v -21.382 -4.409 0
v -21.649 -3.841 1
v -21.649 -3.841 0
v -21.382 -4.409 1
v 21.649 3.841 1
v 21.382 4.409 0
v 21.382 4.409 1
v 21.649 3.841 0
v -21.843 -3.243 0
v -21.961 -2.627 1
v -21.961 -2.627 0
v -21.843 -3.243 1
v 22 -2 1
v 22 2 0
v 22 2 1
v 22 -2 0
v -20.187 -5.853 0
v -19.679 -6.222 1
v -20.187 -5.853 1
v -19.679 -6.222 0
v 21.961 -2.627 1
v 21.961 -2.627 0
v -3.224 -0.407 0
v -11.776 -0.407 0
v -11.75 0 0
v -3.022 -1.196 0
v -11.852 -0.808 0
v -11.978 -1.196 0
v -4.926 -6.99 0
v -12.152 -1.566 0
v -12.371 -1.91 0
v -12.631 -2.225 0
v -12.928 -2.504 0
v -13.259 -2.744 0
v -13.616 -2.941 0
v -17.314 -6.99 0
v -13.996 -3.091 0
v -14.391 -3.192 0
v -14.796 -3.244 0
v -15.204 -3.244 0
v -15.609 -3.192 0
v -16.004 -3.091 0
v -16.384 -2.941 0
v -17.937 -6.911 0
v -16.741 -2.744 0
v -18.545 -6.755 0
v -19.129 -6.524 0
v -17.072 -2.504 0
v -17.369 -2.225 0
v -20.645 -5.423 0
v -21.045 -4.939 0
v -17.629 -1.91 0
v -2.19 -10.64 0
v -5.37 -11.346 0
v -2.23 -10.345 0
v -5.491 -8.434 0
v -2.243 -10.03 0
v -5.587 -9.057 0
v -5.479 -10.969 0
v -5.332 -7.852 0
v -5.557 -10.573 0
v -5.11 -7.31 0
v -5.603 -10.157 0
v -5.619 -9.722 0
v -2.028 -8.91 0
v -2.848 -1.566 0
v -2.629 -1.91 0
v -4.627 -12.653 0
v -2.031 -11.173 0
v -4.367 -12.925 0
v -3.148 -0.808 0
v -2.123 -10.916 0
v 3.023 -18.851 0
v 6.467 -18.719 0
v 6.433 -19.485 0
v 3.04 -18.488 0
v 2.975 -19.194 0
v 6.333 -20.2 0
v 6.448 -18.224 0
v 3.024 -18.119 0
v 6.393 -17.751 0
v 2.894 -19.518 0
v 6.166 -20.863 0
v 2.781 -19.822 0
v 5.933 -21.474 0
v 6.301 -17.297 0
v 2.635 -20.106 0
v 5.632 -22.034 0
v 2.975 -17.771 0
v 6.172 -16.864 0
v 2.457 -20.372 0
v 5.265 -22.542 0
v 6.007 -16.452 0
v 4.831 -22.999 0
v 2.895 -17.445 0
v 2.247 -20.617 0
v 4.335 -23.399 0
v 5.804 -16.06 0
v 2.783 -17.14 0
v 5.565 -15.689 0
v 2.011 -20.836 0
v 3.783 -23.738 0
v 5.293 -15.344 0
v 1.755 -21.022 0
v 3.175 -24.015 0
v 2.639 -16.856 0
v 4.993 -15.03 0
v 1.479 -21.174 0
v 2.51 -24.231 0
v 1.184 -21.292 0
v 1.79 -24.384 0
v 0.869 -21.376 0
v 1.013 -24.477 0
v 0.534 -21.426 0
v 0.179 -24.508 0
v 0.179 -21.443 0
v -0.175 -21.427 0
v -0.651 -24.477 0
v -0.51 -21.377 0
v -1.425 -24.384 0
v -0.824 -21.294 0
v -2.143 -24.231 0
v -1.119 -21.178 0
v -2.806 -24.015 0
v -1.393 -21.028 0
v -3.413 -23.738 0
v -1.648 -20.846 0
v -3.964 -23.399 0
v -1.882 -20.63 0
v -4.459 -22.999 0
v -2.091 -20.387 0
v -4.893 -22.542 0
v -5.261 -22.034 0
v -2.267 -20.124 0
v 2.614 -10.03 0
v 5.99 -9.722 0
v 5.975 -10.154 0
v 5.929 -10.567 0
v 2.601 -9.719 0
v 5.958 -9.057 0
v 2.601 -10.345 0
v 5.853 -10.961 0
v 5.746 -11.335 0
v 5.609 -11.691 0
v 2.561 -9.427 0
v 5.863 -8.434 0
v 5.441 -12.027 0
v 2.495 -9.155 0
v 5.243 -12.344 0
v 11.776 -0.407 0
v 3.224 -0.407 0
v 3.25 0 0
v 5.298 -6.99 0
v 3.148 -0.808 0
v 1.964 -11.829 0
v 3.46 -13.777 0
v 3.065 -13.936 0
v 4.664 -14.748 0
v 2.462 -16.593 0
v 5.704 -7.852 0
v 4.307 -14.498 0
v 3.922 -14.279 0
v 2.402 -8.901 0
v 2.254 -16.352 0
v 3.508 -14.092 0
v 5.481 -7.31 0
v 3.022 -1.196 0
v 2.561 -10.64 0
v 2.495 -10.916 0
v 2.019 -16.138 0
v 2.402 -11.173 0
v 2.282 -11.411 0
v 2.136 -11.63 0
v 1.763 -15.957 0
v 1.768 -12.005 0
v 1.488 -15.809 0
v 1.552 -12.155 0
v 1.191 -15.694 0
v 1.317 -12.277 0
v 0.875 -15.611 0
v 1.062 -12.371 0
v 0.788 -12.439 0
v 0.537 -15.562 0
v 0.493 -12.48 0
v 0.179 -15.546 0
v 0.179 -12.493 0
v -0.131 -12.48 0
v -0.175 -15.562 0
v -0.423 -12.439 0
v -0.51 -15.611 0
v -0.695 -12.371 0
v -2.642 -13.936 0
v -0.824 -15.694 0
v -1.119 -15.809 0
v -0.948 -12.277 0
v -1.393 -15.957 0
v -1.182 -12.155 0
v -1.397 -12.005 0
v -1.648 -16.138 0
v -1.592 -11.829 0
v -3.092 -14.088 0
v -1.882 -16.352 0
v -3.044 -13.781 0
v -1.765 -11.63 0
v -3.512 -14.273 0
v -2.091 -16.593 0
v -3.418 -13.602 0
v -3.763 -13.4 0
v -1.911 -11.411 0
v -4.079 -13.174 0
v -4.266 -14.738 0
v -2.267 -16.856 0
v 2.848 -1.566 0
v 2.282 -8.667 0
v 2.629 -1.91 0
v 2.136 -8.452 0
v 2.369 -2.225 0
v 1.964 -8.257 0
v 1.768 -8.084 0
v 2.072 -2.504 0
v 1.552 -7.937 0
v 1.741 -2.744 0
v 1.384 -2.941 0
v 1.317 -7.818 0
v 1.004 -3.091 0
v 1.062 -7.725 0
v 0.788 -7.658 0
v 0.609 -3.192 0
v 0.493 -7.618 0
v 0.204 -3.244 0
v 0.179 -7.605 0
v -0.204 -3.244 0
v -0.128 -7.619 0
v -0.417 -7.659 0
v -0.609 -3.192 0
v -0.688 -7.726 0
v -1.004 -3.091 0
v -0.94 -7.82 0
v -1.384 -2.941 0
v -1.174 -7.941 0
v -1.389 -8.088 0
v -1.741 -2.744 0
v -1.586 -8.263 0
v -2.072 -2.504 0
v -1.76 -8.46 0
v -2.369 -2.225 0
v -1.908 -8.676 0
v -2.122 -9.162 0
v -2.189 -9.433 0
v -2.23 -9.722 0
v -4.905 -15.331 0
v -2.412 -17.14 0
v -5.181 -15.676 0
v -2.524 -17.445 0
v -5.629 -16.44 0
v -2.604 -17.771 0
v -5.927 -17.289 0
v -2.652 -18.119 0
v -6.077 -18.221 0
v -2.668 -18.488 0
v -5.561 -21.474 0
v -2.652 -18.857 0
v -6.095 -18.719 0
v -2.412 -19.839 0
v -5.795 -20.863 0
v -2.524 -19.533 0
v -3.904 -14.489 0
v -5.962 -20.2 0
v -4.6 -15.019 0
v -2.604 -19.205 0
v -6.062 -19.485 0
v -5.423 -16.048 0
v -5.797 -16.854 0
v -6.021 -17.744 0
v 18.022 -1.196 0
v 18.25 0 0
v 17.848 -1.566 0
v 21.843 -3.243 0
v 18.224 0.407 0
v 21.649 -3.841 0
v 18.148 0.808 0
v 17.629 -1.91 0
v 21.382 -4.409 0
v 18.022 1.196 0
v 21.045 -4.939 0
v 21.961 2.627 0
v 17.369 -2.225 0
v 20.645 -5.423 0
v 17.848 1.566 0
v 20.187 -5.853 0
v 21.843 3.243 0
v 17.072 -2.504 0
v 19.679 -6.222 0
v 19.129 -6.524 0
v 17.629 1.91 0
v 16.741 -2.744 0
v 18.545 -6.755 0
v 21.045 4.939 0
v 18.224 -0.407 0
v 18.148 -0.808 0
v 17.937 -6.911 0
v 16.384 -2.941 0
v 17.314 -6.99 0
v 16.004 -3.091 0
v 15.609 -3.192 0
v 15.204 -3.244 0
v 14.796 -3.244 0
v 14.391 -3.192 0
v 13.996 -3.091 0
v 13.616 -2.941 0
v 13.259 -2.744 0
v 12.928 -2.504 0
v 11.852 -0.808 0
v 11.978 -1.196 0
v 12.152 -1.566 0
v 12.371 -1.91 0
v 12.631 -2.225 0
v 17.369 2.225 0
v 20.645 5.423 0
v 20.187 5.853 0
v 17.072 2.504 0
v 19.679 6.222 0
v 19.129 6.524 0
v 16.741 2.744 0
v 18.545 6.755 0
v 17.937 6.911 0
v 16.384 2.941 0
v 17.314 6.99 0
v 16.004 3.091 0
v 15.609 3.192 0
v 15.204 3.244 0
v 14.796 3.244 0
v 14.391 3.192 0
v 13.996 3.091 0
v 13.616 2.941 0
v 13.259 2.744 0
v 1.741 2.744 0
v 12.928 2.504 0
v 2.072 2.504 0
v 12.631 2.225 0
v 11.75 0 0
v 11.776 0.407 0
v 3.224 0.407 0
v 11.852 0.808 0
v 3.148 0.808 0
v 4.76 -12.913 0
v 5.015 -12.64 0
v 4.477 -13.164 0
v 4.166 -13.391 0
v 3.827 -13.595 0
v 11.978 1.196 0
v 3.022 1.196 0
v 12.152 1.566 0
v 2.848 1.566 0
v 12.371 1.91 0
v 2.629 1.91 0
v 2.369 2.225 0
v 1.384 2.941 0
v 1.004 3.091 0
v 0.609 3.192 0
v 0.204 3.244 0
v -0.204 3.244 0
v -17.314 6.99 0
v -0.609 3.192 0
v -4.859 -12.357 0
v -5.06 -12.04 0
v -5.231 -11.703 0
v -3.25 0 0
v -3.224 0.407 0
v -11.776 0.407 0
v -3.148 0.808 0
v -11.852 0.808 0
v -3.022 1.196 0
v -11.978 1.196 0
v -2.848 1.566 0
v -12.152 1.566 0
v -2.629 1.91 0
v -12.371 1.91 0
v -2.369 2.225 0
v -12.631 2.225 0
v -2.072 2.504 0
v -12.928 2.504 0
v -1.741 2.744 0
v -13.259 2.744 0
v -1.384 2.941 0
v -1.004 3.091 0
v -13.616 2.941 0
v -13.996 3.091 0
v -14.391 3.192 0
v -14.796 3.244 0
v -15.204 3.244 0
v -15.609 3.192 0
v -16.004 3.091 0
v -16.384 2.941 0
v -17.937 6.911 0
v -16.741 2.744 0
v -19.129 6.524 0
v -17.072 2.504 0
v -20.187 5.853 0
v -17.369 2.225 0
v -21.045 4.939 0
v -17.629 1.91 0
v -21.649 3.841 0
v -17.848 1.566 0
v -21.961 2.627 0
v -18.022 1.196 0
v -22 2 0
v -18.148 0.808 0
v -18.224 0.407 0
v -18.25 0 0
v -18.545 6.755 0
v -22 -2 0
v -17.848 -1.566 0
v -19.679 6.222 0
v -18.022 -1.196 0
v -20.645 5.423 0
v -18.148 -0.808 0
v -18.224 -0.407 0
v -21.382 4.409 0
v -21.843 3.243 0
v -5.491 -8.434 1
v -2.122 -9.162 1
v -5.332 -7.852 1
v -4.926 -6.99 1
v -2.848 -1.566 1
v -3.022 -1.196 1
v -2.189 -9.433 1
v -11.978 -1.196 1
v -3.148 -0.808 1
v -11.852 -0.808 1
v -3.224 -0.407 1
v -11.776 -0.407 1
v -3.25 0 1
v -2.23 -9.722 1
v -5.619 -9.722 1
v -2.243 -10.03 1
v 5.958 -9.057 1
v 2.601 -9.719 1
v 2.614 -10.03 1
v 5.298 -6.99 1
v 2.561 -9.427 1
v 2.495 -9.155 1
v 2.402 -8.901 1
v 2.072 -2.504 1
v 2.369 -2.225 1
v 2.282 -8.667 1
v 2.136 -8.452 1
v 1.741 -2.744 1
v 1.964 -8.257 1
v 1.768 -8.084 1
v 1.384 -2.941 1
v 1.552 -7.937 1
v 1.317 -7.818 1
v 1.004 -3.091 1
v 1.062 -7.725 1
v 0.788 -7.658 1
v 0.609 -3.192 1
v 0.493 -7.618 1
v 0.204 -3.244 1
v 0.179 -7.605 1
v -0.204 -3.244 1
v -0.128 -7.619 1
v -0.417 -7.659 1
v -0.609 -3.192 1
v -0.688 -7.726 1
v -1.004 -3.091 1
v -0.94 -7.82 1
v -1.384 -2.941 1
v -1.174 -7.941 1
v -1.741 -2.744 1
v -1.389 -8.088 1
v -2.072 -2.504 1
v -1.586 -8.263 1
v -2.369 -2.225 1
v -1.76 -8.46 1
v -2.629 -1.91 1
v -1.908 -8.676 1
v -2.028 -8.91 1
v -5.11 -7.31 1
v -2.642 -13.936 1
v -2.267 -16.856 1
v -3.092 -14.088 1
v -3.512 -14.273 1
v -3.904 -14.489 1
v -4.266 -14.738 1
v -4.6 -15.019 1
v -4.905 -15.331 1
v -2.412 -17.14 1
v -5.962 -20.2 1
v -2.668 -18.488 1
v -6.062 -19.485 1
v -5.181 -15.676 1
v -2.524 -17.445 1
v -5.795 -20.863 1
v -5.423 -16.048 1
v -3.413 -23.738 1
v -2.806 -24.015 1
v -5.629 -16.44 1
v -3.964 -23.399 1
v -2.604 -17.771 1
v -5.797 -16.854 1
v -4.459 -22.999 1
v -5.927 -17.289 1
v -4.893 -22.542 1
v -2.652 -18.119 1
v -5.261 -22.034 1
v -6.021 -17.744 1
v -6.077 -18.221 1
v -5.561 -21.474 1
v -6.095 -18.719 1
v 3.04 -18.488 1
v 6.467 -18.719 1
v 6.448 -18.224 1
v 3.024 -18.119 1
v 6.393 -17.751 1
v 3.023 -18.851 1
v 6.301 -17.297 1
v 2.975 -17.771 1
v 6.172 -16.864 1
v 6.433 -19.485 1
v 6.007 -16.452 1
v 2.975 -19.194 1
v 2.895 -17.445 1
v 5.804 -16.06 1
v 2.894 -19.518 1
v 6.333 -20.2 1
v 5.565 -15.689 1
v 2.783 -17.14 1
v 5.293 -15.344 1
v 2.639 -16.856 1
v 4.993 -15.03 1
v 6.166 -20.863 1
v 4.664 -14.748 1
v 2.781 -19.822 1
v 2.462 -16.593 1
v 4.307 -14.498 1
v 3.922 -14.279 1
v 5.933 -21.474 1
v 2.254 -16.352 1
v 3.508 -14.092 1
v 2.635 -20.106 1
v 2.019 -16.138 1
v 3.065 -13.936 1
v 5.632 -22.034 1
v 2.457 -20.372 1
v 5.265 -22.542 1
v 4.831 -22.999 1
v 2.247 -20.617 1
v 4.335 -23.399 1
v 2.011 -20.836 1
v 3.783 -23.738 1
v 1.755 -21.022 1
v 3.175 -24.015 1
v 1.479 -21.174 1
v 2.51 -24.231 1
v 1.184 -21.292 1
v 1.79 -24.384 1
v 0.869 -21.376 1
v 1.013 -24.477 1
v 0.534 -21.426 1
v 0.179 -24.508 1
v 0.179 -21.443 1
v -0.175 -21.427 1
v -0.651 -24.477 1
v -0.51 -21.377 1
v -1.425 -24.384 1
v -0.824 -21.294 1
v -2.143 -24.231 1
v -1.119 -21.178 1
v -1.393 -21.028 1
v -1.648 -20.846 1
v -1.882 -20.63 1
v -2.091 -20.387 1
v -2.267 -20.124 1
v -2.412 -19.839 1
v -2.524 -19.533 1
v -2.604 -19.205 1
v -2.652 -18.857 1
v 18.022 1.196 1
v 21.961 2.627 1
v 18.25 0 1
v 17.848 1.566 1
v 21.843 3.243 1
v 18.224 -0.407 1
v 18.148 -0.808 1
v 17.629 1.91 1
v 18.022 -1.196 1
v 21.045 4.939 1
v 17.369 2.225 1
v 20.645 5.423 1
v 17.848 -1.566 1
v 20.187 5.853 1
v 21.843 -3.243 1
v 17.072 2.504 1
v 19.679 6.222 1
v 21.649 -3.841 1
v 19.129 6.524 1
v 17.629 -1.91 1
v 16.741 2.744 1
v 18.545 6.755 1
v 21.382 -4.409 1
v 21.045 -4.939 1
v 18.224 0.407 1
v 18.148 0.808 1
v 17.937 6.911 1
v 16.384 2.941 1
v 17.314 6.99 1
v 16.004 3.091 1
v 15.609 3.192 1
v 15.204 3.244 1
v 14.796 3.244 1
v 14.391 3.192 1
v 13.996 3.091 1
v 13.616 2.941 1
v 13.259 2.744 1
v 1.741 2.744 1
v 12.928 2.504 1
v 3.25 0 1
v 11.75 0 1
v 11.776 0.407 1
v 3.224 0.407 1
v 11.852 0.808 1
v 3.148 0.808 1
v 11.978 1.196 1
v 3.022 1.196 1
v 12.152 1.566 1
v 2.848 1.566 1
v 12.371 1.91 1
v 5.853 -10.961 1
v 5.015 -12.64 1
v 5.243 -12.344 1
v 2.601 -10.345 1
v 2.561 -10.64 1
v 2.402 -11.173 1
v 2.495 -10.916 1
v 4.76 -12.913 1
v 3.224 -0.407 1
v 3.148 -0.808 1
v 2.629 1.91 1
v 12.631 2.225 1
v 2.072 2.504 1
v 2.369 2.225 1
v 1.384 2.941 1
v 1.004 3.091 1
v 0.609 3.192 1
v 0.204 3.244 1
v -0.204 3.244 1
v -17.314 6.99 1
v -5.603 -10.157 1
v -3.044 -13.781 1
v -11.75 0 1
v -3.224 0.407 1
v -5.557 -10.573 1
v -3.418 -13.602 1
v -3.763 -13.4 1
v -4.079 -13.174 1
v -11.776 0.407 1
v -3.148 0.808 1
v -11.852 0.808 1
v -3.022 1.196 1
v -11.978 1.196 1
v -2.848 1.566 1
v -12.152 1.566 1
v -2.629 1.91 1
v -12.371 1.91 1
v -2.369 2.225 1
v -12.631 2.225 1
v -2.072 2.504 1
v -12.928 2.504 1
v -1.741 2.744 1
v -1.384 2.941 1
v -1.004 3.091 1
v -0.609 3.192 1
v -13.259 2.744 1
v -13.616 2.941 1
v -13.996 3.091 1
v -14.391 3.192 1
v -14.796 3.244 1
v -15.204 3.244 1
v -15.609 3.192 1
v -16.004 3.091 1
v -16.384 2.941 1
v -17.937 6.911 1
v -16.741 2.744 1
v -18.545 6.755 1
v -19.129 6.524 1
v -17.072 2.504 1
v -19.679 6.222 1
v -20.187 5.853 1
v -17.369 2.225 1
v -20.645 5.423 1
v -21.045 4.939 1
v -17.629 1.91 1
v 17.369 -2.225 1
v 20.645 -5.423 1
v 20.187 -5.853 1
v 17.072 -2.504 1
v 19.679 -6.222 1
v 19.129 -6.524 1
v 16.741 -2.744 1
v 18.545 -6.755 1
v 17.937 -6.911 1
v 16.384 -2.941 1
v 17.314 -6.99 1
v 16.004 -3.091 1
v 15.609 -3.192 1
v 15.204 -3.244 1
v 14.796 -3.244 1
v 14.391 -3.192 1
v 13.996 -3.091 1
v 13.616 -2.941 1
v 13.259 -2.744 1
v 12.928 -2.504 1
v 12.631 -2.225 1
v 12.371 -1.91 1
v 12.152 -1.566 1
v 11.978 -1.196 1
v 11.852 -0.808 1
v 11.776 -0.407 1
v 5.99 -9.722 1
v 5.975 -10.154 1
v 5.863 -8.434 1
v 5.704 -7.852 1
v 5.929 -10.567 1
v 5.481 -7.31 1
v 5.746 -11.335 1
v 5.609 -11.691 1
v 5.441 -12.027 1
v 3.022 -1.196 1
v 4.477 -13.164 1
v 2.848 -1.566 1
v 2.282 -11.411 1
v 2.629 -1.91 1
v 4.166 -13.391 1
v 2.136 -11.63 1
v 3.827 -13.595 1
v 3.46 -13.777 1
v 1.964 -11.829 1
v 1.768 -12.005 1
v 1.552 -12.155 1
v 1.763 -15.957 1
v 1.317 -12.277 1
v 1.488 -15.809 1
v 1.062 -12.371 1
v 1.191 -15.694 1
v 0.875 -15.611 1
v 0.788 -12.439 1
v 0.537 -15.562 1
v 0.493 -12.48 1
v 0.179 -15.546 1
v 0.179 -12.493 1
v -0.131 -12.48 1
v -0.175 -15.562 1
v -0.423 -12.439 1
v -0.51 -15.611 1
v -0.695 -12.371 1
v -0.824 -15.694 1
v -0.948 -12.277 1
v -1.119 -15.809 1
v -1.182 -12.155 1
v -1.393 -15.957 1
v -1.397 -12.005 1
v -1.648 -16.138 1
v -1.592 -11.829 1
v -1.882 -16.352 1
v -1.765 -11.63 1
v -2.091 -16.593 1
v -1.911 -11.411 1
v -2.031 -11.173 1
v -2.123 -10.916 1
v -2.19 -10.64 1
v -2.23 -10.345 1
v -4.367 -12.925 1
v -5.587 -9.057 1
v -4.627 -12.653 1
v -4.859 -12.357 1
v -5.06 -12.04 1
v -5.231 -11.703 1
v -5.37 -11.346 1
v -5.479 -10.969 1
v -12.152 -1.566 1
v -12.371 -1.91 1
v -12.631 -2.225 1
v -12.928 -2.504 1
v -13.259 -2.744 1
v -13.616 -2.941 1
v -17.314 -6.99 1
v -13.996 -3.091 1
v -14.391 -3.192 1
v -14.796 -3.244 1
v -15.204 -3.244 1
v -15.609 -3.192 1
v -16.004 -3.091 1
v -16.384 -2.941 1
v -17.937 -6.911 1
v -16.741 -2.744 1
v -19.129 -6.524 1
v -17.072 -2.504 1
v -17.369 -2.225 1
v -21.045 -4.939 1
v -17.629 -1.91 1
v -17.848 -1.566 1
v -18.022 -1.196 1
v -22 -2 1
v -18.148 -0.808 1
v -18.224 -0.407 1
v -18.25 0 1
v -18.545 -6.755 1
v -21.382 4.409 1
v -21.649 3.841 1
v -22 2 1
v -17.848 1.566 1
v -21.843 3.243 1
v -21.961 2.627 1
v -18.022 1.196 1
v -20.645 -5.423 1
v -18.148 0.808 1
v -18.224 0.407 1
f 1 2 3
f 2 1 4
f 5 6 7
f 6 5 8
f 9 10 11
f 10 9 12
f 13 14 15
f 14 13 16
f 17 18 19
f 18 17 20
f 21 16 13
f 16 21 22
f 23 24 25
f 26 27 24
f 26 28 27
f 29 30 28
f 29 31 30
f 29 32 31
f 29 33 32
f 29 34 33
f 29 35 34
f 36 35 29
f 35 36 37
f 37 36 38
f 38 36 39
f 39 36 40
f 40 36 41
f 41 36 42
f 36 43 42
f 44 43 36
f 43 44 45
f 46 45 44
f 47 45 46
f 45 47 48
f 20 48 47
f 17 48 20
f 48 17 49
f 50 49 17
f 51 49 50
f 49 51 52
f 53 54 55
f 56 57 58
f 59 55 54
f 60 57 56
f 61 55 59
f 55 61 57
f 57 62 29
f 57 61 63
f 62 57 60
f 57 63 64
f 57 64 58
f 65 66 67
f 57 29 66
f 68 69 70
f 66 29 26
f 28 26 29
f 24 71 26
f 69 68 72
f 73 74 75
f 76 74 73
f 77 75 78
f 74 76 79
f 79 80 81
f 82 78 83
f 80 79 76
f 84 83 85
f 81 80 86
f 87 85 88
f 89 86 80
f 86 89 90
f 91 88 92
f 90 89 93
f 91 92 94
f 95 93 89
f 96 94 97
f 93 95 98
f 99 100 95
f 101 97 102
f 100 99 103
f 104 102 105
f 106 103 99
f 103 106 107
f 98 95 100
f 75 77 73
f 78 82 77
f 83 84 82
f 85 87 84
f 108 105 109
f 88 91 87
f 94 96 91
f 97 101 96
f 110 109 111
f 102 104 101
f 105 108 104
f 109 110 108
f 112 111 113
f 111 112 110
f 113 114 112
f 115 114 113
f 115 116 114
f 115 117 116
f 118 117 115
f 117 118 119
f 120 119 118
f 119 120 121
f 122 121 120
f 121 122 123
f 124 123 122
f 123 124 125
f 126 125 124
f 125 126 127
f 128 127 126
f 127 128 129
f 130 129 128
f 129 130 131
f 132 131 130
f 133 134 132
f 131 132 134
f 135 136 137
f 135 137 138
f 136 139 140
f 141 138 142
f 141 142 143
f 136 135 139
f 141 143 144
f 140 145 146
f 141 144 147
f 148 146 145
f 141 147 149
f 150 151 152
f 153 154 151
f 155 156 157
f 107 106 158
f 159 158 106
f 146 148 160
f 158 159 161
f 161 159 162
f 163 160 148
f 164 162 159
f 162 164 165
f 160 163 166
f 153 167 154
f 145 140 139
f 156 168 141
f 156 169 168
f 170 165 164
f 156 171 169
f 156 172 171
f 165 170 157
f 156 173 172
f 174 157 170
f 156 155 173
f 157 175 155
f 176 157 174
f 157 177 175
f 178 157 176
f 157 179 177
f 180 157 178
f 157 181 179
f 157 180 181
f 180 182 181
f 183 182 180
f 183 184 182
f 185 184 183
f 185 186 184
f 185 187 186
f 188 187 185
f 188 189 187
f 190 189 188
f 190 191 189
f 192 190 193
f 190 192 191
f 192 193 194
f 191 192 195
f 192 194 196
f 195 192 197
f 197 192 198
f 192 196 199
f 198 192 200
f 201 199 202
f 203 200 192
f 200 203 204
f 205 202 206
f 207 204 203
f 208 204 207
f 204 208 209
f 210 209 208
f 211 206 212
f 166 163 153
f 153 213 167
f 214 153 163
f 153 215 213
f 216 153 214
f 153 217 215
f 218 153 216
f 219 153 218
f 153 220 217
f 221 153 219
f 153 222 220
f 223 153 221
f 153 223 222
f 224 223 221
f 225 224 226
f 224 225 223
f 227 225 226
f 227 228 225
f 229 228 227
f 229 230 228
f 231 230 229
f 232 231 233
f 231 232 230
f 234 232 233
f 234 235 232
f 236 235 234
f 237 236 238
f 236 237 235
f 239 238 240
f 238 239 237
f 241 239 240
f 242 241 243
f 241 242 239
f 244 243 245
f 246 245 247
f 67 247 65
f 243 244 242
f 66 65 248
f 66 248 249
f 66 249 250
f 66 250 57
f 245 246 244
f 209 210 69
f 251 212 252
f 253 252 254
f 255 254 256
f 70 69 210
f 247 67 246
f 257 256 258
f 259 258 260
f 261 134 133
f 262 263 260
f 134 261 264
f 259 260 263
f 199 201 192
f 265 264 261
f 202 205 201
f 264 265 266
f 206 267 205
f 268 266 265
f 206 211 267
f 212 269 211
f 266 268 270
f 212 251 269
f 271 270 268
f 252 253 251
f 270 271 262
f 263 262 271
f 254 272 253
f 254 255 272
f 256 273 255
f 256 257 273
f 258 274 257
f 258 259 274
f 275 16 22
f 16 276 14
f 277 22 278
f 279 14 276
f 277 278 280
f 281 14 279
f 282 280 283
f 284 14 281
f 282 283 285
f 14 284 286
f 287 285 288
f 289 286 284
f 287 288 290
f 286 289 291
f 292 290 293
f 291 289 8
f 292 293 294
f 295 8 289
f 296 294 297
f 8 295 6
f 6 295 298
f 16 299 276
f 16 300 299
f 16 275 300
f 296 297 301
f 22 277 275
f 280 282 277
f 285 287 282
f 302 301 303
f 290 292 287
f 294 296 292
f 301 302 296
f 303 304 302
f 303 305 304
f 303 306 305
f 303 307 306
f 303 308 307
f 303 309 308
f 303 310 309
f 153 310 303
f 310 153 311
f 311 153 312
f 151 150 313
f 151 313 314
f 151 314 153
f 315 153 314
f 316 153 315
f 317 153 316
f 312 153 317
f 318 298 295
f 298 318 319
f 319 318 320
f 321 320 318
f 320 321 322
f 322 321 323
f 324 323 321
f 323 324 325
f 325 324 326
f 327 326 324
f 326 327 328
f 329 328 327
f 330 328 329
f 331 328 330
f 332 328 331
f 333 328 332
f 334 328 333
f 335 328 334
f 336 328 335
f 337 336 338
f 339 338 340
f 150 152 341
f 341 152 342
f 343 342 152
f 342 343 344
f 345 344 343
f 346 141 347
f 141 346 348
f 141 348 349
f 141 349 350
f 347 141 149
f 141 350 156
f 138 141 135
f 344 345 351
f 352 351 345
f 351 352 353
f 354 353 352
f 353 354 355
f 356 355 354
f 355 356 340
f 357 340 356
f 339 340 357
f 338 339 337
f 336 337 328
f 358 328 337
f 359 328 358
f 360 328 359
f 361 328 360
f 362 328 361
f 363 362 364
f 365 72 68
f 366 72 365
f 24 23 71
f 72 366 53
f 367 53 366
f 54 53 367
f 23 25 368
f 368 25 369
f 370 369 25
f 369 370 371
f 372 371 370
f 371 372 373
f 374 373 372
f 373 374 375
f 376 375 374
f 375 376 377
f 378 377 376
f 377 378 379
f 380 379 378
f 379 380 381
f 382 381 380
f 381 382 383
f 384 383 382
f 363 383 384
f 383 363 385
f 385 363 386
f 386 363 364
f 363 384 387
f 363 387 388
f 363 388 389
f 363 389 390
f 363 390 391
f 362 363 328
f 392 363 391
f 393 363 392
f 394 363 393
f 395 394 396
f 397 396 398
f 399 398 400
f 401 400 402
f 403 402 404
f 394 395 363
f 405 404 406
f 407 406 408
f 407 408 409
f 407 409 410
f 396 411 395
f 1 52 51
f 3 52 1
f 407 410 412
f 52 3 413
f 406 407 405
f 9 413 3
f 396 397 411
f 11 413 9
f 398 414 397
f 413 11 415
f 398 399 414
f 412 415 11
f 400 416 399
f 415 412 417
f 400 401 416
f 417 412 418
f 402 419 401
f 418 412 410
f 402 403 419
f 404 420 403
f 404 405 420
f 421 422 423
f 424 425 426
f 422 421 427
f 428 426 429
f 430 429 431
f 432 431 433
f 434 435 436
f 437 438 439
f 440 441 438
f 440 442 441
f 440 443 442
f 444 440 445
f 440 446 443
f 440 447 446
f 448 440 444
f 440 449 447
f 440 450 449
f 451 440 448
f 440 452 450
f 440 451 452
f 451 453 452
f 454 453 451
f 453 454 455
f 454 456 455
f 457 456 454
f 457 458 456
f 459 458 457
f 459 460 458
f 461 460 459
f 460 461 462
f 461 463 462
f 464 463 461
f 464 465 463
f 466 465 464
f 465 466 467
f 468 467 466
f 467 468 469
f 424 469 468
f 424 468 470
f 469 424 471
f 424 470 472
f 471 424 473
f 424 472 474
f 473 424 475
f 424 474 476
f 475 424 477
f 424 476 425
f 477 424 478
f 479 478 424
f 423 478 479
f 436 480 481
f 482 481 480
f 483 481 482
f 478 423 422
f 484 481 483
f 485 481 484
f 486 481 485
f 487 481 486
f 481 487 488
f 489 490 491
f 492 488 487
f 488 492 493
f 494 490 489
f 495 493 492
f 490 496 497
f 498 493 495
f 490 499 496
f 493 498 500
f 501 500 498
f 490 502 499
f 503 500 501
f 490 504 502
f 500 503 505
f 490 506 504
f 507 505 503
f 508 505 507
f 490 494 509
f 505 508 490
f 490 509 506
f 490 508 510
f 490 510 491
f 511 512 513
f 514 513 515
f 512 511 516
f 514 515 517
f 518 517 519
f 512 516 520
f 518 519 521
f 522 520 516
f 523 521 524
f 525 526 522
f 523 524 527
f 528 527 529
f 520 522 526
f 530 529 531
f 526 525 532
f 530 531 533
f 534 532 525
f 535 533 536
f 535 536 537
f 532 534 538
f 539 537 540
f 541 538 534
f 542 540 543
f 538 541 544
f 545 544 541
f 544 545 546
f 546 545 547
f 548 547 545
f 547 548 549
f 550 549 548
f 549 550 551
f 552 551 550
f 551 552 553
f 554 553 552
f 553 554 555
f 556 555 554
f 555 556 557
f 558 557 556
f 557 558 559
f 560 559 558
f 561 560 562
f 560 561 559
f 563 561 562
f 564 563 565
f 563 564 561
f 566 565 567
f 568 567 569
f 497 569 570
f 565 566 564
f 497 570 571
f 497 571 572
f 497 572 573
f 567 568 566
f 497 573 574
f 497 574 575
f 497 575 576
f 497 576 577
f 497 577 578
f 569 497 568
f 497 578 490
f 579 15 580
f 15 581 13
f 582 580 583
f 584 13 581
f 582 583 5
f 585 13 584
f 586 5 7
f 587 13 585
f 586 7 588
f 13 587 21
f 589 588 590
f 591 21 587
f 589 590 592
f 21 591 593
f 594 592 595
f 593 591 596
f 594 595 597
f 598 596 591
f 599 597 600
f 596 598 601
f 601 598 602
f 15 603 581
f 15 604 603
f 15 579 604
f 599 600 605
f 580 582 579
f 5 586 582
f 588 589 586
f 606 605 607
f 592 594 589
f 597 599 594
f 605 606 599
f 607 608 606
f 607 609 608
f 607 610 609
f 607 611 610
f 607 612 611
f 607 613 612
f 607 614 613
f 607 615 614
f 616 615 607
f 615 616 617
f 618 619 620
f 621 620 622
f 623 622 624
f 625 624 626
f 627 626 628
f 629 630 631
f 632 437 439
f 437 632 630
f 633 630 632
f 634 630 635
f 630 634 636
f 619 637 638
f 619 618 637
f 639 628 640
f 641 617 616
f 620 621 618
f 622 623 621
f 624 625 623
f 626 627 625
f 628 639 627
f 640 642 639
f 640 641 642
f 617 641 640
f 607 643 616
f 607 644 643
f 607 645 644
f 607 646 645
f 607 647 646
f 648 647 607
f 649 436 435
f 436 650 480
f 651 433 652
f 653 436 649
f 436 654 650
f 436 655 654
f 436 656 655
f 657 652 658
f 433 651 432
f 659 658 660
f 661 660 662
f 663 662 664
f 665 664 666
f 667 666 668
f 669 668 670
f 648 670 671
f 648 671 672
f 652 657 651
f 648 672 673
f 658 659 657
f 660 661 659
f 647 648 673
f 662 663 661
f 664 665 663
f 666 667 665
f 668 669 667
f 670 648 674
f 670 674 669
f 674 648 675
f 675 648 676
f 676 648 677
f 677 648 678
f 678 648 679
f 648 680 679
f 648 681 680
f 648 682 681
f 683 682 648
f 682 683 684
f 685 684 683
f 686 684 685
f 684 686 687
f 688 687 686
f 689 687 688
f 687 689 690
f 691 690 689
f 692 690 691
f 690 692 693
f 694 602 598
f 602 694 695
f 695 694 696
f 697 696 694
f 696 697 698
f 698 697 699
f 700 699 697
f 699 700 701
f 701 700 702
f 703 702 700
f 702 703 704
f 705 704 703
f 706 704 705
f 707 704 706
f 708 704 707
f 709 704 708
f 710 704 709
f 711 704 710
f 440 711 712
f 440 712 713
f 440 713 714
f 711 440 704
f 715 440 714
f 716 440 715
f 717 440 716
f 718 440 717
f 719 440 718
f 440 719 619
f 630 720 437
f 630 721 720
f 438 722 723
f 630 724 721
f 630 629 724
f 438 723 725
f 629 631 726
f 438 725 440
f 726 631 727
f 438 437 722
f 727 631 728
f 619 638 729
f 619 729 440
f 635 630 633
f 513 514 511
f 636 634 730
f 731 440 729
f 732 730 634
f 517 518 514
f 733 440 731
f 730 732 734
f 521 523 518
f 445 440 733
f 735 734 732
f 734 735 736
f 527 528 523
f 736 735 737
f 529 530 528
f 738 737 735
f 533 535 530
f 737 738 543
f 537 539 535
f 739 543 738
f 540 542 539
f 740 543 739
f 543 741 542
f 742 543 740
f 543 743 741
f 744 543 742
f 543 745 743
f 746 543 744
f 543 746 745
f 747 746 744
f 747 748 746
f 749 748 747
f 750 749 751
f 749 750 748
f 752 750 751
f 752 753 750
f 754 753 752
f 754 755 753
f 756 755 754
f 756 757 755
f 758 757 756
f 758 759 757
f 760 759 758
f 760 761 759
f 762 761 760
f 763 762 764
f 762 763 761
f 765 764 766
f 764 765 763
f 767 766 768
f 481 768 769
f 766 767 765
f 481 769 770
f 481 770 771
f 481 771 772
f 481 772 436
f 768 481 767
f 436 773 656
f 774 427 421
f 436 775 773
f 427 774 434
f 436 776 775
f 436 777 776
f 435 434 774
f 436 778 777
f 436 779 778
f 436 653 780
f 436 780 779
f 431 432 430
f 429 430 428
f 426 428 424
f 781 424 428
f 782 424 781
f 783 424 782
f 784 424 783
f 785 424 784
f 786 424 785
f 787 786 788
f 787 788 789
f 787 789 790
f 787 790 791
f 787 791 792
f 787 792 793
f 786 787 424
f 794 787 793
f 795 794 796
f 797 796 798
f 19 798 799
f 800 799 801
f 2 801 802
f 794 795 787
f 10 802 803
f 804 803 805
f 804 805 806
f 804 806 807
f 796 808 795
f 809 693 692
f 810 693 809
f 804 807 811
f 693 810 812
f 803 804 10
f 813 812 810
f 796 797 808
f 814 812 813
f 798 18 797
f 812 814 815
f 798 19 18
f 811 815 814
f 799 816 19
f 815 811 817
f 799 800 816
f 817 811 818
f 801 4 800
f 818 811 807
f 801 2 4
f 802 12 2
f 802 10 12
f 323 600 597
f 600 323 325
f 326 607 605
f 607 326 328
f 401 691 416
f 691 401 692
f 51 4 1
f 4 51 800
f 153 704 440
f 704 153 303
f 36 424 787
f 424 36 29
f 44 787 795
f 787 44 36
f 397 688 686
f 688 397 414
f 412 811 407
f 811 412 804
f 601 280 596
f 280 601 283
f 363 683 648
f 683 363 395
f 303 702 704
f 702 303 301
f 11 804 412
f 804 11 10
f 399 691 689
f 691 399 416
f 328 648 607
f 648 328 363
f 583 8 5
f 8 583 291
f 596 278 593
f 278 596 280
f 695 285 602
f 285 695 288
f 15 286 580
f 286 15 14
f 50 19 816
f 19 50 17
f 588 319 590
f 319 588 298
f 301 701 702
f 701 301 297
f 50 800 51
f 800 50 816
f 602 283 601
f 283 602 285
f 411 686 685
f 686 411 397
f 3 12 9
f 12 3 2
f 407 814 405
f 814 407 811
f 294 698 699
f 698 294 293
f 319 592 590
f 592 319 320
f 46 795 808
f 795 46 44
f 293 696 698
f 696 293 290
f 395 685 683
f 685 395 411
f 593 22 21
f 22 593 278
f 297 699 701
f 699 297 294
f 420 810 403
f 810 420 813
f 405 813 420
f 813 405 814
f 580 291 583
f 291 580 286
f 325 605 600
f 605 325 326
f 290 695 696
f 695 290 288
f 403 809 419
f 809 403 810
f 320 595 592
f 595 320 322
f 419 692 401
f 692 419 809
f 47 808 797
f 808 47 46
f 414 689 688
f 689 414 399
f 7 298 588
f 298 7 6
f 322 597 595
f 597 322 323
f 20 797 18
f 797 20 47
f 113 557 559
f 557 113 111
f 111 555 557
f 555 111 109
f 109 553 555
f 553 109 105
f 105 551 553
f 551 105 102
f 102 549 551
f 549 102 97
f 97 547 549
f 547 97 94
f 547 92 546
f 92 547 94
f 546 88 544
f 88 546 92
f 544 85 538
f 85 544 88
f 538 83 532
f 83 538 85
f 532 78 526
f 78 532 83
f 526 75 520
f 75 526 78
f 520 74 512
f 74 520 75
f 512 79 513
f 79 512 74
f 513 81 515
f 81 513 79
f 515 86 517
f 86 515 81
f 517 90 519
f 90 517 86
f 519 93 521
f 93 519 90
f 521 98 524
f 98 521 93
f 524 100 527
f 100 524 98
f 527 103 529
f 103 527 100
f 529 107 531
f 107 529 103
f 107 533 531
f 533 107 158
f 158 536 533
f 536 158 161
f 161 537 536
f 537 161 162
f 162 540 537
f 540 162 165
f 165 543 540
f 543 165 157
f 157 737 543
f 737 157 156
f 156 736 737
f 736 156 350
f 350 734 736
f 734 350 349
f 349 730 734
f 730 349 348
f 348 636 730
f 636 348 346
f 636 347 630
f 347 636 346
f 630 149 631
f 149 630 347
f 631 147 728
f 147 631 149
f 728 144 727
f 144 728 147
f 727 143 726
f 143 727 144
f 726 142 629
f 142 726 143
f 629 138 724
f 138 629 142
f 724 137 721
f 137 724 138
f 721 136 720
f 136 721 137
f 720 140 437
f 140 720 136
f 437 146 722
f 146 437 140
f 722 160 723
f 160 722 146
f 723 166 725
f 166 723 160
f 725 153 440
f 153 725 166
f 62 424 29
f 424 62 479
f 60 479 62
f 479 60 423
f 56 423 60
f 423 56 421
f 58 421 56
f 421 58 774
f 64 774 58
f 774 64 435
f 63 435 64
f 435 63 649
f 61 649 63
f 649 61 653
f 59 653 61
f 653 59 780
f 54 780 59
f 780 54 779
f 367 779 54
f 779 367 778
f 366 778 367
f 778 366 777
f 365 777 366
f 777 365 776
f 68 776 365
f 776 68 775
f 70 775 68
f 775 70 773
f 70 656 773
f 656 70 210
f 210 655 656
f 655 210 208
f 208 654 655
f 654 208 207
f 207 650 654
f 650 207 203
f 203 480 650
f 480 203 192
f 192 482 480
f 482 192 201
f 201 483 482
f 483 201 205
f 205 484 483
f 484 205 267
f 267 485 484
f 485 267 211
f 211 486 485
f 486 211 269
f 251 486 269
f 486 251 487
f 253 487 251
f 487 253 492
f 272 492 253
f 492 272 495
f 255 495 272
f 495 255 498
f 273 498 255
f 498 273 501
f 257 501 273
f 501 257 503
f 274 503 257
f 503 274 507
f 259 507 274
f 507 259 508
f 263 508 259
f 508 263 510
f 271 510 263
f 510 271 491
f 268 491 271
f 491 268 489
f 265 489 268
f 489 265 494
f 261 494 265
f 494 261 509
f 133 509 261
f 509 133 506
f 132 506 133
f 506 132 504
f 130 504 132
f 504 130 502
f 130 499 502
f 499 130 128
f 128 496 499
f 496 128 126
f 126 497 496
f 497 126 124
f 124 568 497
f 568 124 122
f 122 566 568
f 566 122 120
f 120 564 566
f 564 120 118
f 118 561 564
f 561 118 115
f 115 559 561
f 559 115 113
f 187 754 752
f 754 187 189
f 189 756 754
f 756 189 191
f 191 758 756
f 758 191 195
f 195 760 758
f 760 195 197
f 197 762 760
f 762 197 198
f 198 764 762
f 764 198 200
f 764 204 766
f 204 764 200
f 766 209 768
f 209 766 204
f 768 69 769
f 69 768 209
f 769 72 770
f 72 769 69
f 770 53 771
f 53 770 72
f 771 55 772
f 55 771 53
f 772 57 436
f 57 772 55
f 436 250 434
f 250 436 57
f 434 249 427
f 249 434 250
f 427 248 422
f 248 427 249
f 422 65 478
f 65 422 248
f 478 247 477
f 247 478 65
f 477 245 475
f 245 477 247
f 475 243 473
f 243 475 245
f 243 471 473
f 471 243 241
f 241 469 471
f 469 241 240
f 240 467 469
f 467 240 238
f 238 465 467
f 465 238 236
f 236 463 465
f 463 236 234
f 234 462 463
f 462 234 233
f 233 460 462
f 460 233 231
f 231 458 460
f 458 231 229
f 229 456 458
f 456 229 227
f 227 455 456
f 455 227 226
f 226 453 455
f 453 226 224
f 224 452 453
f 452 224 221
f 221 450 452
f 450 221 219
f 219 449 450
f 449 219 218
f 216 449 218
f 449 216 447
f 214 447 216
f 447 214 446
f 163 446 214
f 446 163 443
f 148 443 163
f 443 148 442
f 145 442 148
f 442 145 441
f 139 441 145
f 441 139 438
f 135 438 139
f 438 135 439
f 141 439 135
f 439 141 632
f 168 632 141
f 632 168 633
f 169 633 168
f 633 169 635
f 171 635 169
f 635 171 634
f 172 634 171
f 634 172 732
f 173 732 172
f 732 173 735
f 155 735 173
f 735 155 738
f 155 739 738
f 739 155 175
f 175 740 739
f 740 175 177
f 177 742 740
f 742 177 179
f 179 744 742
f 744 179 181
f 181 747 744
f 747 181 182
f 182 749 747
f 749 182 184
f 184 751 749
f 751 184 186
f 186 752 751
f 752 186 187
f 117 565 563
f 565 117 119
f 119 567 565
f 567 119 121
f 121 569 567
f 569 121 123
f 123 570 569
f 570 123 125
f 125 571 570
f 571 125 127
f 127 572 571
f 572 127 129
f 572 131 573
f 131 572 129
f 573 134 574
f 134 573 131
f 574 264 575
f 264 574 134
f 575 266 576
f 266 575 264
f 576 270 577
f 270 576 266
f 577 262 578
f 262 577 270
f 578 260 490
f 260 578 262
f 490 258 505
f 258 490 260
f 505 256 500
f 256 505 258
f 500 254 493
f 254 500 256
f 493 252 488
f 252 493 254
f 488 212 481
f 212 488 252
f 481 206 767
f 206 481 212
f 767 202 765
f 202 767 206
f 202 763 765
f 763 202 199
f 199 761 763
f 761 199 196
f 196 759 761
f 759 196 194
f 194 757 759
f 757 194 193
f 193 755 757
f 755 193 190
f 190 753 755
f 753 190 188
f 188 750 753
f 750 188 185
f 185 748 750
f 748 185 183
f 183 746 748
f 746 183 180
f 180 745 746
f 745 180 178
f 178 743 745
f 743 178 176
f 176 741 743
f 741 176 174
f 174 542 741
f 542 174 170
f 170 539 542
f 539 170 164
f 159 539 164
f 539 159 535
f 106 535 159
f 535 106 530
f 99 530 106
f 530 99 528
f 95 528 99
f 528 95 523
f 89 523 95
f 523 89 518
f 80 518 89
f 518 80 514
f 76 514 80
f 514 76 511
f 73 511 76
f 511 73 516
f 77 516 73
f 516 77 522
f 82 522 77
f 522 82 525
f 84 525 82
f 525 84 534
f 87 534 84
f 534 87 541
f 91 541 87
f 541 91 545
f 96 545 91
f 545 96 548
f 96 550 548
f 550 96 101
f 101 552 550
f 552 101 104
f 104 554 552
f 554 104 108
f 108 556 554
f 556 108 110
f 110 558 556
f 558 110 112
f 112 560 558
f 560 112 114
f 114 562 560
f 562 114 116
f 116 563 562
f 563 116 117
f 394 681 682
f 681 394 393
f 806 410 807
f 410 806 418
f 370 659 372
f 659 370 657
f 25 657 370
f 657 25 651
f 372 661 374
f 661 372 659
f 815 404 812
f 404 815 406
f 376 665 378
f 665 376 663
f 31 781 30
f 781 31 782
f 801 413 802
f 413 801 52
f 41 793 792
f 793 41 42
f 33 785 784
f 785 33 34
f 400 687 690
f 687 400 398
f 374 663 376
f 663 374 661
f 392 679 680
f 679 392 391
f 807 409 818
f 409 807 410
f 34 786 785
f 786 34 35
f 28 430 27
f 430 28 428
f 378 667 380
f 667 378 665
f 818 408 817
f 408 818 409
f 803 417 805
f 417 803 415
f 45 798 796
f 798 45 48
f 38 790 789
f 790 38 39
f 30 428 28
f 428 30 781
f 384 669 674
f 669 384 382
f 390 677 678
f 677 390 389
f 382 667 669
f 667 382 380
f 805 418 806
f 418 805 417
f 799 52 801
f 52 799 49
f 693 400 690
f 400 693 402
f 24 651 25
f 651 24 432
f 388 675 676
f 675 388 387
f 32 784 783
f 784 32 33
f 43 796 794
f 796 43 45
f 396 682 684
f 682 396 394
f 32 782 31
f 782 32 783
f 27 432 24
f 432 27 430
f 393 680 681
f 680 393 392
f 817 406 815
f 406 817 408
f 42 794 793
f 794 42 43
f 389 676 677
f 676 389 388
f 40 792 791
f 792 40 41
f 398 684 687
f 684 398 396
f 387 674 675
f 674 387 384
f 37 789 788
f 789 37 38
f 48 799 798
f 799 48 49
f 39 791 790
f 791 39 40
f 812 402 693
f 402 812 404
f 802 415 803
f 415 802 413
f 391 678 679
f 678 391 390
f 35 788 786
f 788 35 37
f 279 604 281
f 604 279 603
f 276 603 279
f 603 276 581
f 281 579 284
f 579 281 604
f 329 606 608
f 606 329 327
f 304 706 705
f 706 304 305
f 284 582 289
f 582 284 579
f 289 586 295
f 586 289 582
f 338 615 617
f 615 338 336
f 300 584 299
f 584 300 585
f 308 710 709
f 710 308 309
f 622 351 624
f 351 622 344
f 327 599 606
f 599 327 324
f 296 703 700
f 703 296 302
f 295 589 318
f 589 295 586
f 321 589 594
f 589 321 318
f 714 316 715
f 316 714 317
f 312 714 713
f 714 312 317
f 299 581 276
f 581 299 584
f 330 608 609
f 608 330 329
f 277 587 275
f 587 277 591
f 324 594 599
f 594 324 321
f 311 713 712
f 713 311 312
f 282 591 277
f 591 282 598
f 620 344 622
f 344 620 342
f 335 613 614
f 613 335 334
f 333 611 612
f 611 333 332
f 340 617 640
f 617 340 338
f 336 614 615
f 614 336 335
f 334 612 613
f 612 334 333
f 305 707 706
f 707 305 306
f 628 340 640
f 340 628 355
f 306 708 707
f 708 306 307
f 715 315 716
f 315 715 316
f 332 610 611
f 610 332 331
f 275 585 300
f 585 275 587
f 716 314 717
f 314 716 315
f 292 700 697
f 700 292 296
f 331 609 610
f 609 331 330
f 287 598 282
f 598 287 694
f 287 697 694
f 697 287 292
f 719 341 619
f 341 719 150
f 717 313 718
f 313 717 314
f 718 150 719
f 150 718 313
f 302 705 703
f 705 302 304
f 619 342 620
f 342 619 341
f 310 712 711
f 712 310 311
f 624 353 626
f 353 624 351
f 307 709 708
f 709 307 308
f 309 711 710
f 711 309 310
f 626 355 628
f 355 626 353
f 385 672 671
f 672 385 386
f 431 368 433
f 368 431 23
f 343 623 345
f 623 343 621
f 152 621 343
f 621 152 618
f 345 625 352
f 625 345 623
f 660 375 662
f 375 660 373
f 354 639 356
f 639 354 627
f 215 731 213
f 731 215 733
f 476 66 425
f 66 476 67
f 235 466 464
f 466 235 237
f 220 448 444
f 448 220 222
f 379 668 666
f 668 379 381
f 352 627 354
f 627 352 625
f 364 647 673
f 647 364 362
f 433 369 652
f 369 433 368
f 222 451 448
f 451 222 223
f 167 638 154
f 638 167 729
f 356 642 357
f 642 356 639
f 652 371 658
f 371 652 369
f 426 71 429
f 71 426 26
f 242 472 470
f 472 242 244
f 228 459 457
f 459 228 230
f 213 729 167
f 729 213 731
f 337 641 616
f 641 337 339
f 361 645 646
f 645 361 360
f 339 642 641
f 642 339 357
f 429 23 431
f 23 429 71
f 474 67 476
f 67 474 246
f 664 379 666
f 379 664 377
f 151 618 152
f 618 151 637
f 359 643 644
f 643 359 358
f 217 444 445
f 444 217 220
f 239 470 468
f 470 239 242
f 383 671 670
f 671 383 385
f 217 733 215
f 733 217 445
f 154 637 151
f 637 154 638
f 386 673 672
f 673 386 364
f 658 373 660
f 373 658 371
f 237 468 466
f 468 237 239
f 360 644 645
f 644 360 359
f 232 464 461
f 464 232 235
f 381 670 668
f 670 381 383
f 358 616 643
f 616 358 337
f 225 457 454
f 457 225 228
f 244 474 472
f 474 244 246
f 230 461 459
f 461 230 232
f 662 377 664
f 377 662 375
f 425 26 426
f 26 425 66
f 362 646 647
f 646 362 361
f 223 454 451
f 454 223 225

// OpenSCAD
$fn = 50;


difference() {
	union() {
		translate(v = [0, 0, 0]) {
			rotate(a = [0, 0, 0]) {
				hull() {
					translate(v = [-17.0000000000, 2.0000000000, 0]) {
						rotate(a = [0, 0, 0]) {
							translate(v = [0, 0, 0]) {
								rotate(a = [0, 0, 0]) {
									cylinder(h = 1, r = 5);
								}
							}
						}
					}
					translate(v = [17.0000000000, 2.0000000000, 0]) {
						rotate(a = [0, 0, 0]) {
							translate(v = [0, 0, 0]) {
								rotate(a = [0, 0, 0]) {
									cylinder(h = 1, r = 5);
								}
							}
						}
					}
					translate(v = [-17.0000000000, -2.0000000000, 0]) {
						rotate(a = [0, 0, 0]) {
							translate(v = [0, 0, 0]) {
								rotate(a = [0, 0, 0]) {
									cylinder(h = 1, r = 5);
								}
							}
						}
					}
					translate(v = [17.0000000000, -2.0000000000, 0]) {
						rotate(a = [0, 0, 0]) {
							translate(v = [0, 0, 0]) {
								rotate(a = [0, 0, 0]) {
									cylinder(h = 1, r = 5);
								}
							}
						}
					}
				}
			}
		}
		translate(v = [0, -5, 0]) {
			rotate(a = [0, 0, 0]) {
				linear_extrude(height = 1) {
					text(font = "DejaVu Sans Mono:style=Bold", halign = "center", size = 19.0000000000, text = "8", valign = "top");
				}
			}
		}
	}
	union() {
		translate(v = [-15.0000000000, 0.0000000000, -125.0000000000]) {
			rotate(a = [0, 0, 0]) {
				cylinder(h = 250, r = 3.2500000000);
			}
		}
		translate(v = [15.0000000000, 0.0000000000, -125.0000000000]) {
			rotate(a = [0, 0, 0]) {
				cylinder(h = 250, r = 3.2500000000);
			}
		}
		translate(v = [15.0000000000, 0.0000000000, -125.0000000000]) {
			rotate(a = [0, 0, 0]) {
				cylinder(h = 250, r = 3.2500000000);
			}
		}
		translate(v = [0, 0, -125.0000000000]) {
			rotate(a = [0, 0, 0]) {
				cylinder(h = 250, r = 3.2500000000);
			}
		}
	}
}
